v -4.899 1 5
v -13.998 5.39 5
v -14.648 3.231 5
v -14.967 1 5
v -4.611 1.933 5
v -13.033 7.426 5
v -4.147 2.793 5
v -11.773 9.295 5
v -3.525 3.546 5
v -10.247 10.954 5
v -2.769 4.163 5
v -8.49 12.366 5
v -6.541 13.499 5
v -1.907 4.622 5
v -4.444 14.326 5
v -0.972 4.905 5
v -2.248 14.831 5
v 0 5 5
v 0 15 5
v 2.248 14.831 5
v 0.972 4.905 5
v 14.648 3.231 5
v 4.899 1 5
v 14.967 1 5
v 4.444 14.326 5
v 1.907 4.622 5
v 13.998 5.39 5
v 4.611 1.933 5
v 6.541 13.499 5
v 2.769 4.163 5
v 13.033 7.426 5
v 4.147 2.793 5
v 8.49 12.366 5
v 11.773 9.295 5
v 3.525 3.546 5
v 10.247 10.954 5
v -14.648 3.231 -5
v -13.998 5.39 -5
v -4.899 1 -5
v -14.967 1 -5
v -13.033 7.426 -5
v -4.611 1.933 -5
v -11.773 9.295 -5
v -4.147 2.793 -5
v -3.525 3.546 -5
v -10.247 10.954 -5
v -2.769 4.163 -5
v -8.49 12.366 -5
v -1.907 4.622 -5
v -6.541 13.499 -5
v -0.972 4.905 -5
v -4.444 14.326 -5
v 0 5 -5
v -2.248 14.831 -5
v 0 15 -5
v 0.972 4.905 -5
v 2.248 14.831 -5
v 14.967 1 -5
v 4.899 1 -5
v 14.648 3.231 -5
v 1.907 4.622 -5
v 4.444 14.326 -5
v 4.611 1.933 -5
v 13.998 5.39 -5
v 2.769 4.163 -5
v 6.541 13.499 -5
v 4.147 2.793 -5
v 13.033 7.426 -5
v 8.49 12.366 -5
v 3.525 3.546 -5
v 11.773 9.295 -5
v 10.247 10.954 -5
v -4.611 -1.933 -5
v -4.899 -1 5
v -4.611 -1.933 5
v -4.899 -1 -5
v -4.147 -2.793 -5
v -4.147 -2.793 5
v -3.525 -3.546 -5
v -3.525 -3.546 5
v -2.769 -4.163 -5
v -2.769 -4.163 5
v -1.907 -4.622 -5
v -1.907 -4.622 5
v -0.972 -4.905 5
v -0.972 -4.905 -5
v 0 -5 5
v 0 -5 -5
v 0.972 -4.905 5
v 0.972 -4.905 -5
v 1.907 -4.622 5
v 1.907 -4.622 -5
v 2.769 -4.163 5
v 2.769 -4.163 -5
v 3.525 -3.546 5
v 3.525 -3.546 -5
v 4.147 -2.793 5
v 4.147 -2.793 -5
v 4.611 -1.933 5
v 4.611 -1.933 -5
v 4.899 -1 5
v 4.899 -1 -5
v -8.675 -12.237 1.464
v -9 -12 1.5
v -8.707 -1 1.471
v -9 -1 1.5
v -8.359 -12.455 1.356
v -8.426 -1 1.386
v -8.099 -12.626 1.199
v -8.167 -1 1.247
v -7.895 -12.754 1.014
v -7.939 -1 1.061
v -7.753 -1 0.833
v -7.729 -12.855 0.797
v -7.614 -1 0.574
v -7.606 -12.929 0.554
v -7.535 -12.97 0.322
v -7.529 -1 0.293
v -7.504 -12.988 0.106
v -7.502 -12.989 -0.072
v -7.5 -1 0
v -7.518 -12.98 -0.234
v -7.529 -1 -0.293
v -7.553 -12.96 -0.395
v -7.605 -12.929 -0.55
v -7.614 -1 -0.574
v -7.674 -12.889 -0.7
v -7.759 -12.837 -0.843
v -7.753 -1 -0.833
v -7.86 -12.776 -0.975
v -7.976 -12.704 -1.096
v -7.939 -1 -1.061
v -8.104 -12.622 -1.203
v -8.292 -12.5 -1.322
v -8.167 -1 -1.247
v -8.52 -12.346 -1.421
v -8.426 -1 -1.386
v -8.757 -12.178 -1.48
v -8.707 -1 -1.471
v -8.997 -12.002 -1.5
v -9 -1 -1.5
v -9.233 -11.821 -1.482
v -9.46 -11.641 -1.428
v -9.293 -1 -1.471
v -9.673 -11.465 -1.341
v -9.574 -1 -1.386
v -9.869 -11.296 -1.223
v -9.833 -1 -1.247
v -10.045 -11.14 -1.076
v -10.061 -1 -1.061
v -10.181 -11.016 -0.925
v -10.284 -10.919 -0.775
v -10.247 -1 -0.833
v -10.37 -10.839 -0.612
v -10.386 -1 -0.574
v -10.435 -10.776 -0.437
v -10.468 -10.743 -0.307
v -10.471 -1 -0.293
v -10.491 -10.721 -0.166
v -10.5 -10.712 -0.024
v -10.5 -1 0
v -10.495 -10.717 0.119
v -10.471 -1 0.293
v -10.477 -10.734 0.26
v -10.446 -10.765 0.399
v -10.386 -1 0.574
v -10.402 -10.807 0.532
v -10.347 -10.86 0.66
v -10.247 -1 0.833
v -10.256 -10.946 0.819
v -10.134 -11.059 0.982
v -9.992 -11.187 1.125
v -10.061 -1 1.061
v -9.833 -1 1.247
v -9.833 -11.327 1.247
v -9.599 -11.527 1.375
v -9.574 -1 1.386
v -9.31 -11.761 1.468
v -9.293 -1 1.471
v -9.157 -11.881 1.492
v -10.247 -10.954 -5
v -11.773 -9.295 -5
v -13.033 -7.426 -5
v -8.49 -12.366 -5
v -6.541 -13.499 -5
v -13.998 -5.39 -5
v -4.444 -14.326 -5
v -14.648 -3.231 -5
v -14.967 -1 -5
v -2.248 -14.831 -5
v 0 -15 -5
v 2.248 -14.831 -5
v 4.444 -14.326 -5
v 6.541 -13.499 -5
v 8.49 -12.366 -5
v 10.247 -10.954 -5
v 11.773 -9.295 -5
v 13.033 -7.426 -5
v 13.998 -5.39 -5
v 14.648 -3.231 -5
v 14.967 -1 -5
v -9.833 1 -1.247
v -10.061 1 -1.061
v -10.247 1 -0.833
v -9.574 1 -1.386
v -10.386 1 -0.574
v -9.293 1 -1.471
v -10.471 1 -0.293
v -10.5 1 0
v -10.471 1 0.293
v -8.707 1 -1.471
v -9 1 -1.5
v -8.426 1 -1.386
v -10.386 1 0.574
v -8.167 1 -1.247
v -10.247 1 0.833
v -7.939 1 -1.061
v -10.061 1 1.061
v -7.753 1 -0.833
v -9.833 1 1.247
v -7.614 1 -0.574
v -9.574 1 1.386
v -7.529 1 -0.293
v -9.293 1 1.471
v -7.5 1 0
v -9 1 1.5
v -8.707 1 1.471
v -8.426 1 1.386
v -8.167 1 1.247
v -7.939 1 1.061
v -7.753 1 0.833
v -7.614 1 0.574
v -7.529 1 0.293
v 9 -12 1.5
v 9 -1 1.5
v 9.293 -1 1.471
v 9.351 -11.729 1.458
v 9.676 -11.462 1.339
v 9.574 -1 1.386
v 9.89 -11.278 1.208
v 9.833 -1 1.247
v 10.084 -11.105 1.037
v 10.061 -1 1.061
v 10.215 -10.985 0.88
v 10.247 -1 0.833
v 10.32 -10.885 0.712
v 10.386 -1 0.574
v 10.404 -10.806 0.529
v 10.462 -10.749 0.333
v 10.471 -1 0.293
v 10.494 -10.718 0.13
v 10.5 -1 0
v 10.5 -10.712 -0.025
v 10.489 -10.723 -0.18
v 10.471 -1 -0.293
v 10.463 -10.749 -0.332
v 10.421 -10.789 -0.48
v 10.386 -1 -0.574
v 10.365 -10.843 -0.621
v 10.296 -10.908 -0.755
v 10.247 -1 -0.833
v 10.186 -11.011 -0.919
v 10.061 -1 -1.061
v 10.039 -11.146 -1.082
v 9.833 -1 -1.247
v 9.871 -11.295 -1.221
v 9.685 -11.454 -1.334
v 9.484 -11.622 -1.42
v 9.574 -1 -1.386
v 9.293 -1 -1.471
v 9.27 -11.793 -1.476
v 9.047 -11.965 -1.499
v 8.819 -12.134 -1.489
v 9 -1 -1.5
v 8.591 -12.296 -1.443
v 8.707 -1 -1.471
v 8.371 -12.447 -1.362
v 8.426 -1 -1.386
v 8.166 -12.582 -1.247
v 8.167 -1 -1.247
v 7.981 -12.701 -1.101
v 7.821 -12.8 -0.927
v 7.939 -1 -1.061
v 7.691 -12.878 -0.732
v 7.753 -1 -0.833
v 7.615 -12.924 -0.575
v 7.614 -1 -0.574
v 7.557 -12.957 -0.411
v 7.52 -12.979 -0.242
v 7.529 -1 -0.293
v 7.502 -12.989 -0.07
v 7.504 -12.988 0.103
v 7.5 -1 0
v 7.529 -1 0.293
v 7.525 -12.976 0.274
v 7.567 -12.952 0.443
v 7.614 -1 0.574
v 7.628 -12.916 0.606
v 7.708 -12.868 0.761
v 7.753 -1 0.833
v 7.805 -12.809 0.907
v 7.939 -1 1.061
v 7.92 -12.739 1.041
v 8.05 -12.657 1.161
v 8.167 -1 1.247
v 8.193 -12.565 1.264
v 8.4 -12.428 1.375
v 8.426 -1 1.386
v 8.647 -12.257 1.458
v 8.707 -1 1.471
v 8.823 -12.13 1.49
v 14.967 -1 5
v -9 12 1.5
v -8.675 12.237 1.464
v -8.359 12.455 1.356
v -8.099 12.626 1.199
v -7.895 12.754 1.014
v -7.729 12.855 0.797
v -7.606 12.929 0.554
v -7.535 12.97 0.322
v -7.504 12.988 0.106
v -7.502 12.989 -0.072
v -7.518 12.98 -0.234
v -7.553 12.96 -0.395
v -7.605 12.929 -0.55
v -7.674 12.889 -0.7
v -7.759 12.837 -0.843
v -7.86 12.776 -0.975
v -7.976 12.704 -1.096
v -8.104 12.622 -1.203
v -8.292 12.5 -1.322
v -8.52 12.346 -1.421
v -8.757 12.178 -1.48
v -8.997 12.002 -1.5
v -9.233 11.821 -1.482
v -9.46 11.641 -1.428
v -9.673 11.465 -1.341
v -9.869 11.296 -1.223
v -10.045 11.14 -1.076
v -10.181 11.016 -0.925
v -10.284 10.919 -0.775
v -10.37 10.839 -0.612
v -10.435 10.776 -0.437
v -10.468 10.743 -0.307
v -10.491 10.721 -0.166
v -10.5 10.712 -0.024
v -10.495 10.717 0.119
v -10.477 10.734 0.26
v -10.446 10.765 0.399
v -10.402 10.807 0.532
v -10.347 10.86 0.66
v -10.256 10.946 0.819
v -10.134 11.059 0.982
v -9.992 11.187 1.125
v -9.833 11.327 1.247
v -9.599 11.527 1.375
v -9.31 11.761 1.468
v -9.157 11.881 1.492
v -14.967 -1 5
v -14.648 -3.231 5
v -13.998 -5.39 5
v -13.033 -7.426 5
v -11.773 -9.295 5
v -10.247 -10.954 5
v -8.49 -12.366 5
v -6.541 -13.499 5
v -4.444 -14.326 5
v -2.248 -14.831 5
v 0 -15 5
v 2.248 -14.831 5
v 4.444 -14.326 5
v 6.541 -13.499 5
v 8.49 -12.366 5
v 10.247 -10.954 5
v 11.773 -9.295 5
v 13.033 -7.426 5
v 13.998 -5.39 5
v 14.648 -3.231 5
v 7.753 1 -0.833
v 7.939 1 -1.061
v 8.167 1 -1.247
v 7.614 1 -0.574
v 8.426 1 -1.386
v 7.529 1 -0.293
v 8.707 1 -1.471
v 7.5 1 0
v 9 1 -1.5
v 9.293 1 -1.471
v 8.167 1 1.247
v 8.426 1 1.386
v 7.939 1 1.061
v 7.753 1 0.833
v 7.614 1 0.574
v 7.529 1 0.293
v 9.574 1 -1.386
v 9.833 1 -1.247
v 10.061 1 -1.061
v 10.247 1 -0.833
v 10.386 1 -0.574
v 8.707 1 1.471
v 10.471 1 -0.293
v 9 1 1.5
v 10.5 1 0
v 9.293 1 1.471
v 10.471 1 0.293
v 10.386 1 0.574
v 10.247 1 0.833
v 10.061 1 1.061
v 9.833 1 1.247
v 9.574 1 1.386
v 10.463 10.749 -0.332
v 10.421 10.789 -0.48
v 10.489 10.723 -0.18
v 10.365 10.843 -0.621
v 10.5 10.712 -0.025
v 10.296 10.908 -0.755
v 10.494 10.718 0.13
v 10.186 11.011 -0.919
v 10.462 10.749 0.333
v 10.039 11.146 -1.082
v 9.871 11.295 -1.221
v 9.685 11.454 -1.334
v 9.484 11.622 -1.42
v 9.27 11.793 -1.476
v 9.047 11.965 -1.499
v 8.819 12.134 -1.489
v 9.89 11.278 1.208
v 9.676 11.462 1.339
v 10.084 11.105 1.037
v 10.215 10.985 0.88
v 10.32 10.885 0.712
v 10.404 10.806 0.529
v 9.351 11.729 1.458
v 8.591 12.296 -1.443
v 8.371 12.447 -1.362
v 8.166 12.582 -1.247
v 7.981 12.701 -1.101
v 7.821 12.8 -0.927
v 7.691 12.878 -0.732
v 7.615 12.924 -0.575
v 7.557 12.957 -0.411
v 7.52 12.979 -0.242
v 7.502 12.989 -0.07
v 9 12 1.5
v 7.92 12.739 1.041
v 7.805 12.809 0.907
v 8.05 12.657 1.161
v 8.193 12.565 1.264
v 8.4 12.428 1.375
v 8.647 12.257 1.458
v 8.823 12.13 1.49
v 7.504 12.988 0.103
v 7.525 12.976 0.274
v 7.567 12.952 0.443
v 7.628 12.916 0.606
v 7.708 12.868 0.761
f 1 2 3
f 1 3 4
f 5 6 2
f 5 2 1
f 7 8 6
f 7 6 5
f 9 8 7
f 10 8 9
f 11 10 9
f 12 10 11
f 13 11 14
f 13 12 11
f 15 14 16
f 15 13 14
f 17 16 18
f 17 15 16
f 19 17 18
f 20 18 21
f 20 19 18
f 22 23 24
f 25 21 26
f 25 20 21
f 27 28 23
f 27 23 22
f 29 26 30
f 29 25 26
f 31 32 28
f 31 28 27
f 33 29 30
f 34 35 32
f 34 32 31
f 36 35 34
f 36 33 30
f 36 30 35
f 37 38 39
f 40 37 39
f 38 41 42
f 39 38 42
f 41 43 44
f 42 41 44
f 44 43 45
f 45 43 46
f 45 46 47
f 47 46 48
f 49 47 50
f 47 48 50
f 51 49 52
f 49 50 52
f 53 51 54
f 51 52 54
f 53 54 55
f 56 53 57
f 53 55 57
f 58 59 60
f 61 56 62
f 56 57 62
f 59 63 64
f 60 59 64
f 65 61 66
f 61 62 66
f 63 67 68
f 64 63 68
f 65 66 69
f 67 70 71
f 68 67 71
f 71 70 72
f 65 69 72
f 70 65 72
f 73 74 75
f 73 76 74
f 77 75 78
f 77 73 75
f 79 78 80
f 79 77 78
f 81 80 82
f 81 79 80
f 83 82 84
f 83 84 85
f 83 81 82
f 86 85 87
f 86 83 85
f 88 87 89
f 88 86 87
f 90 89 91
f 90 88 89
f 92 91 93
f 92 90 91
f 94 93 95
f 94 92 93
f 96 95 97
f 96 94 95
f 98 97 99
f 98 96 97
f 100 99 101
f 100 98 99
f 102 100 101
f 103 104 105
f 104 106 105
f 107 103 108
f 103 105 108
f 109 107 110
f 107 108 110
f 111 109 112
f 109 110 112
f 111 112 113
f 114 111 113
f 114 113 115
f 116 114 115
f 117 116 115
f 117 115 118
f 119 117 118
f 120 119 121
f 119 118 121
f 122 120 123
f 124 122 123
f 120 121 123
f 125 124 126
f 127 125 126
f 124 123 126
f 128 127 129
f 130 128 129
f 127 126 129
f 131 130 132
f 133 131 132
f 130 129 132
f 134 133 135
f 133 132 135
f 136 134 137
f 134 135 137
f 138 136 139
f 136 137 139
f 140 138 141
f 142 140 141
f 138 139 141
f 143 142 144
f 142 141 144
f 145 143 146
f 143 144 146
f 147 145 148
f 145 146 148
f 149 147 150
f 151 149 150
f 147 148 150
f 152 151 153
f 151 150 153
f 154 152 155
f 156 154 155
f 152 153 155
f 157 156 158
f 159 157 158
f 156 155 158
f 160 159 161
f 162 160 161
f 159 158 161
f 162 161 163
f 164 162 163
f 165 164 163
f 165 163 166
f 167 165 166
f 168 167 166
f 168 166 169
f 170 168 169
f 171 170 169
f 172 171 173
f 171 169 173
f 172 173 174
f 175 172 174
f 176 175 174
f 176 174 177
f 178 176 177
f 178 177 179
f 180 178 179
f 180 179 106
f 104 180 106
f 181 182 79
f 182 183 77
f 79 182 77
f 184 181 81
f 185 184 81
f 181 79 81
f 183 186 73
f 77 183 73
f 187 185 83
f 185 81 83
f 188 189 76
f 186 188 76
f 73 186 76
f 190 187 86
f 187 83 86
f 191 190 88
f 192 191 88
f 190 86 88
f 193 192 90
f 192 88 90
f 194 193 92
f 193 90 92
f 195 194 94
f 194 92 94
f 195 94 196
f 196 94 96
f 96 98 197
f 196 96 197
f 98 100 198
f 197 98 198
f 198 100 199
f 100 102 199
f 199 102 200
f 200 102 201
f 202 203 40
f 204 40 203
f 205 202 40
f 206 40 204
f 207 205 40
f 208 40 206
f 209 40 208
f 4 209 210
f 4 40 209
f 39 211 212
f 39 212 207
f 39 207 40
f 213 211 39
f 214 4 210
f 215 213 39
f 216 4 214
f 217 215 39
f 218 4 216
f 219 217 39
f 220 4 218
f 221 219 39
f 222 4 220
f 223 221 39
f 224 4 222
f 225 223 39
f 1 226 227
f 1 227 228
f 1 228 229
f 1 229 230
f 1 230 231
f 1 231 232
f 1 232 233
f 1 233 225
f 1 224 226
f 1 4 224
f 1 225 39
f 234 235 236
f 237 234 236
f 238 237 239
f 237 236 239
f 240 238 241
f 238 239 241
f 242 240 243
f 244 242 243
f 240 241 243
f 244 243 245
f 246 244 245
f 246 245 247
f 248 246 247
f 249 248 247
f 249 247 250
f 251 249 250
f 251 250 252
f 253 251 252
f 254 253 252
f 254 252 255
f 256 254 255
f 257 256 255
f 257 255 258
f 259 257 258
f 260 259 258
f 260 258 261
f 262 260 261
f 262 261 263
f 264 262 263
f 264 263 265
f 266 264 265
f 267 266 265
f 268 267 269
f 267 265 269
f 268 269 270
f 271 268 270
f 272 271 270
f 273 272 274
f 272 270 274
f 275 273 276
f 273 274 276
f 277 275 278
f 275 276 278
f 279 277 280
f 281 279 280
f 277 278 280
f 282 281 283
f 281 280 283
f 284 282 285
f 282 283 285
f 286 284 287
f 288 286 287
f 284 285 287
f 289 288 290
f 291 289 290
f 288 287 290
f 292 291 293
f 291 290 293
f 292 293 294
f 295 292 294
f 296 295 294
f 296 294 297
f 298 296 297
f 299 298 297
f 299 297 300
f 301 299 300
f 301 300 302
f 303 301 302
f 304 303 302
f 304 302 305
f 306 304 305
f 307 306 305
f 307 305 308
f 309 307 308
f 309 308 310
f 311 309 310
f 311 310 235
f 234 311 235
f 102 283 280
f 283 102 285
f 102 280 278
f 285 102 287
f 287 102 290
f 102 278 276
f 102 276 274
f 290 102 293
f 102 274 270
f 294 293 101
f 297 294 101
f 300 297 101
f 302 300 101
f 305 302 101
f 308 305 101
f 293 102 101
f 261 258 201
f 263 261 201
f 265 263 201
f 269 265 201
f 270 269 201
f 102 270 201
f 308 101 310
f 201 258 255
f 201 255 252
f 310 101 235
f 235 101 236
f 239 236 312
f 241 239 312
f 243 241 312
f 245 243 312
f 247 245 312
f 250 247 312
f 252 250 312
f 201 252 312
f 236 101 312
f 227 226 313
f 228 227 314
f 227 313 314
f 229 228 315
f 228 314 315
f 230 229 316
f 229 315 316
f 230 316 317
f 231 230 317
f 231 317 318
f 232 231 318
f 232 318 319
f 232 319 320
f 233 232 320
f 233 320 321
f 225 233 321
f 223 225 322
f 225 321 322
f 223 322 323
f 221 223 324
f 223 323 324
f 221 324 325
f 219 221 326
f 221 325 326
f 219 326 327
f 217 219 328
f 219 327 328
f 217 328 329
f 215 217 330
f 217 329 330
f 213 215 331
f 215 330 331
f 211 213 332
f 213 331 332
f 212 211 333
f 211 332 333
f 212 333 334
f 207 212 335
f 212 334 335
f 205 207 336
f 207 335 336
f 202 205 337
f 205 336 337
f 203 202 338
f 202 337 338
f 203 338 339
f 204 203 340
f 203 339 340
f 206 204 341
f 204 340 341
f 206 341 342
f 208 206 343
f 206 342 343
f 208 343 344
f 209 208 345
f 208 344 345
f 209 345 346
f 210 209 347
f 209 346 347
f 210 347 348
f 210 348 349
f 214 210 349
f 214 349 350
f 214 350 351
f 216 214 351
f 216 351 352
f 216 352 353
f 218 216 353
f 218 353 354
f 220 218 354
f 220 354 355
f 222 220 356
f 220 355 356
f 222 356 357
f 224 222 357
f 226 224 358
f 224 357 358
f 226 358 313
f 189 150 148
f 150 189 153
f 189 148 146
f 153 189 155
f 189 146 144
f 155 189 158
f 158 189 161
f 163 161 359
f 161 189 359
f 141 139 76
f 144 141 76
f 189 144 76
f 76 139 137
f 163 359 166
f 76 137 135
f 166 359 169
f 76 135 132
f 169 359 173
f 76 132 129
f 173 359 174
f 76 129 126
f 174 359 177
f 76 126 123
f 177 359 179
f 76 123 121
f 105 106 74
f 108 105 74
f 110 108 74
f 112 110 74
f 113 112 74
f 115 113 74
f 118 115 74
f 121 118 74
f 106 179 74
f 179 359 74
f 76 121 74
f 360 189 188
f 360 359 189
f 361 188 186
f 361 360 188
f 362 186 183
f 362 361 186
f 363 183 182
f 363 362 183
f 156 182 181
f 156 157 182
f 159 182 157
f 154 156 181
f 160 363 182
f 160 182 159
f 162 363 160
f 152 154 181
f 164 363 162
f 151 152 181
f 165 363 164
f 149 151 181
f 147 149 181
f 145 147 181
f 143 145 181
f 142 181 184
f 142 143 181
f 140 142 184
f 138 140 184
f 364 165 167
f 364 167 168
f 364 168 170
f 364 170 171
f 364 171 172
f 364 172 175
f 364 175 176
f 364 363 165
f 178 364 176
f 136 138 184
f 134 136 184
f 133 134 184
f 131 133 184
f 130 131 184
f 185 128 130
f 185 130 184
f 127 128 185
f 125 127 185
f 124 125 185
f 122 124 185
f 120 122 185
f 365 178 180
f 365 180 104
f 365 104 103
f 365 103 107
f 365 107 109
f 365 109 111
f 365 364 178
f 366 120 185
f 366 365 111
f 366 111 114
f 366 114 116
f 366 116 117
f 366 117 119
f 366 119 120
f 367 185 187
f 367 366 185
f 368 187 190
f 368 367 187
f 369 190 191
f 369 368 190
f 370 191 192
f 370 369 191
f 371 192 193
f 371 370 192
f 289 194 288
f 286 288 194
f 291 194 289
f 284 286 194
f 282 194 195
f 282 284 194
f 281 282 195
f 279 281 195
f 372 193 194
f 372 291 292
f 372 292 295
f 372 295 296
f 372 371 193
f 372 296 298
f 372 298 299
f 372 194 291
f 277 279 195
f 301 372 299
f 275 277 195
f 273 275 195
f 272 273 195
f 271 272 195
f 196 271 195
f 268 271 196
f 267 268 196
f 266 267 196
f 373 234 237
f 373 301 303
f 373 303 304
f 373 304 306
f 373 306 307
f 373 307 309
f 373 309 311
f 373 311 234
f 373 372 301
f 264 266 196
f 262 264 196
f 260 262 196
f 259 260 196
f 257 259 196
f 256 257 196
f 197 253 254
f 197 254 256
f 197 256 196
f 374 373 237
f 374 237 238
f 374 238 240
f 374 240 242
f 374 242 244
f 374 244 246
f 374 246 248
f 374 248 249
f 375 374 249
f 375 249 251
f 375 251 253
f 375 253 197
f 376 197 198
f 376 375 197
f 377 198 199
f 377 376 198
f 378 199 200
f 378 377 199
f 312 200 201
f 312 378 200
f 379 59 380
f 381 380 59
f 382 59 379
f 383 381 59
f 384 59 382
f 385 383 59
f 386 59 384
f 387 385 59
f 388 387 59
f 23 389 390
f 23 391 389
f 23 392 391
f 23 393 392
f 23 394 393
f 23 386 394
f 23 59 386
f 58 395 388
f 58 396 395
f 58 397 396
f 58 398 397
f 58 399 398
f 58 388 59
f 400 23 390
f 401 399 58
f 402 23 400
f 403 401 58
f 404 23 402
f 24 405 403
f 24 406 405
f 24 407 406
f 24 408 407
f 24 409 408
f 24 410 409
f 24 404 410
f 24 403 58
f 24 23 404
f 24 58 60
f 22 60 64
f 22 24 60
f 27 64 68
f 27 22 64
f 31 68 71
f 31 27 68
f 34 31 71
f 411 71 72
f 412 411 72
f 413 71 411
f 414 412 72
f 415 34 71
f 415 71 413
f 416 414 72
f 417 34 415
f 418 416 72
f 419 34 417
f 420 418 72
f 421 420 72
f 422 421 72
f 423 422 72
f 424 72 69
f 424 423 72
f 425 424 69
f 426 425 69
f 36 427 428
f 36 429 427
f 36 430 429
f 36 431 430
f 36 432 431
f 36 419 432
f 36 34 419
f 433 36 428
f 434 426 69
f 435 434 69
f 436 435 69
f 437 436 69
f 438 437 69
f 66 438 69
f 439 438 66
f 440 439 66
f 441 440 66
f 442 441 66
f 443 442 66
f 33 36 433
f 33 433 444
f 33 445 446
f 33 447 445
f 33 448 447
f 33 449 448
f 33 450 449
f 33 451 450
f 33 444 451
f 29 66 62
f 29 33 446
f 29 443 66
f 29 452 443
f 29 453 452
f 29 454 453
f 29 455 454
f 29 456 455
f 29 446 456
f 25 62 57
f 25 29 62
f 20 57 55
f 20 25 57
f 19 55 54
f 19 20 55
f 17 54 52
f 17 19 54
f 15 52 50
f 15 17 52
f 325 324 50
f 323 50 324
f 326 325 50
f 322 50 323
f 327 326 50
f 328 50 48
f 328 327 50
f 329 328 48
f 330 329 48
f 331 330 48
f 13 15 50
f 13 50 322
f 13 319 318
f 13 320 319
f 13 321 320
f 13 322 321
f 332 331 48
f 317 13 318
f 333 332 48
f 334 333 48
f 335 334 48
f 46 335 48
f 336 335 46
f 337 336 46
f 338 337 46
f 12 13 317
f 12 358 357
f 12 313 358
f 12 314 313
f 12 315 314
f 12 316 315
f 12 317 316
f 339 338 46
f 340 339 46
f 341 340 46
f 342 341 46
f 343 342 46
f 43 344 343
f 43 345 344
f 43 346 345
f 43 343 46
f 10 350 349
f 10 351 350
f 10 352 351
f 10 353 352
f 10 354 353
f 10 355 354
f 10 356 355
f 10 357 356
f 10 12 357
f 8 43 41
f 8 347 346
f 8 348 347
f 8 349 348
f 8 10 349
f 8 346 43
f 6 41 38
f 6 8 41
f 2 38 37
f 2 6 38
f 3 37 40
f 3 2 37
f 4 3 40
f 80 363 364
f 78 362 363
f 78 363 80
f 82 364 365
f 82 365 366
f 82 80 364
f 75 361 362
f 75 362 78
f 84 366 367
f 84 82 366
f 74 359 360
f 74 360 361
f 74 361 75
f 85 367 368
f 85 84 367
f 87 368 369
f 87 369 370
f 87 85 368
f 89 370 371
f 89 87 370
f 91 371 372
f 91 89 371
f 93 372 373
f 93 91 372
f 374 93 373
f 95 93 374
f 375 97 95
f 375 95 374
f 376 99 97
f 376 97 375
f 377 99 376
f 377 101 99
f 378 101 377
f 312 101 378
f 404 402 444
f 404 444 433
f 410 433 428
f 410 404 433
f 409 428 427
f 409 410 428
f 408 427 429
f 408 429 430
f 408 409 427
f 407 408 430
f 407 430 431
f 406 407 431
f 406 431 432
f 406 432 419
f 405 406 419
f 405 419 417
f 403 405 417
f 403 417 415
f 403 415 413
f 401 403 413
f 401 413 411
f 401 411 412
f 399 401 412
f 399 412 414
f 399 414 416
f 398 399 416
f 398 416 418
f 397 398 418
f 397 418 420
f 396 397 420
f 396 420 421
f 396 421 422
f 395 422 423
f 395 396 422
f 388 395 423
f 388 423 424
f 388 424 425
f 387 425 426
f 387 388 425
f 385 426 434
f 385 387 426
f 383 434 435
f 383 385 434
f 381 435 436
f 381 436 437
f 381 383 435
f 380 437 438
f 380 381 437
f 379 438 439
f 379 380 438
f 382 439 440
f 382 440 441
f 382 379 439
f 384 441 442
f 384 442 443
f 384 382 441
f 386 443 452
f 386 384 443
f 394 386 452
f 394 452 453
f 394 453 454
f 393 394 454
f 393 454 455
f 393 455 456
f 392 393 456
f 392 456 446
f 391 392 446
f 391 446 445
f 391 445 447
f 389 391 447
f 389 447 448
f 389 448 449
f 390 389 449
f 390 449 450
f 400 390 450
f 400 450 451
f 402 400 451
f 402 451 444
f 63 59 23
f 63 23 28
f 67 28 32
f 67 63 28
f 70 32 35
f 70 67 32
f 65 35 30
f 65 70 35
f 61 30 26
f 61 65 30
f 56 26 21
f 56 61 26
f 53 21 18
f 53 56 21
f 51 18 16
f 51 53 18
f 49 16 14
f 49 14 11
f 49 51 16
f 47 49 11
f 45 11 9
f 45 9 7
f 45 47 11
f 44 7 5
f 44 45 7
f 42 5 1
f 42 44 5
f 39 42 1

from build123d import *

# Parameters (mm, degrees)
SKETCH_1_R          = 15
SKETCH_1_R_2        = 5
EXTRUDE_1_DEPTH     = 5
SKETCH_2_W          = 45.571754554
SKETCH_2_H          = 2
CUT_EXTRUDE_1_DEPTH = 33
SKETCH_4_R          = 1.5
CUT_EXTRUDE_2_DEPTH = 41.5


with BuildPart() as part:
    # 草图1 → 凸台-拉伸1 (new, symmetric)
    with BuildSketch(Plane.XY):
        Circle(SKETCH_1_R)
        Circle(SKETCH_1_R_2, mode=Mode.SUBTRACT)
    extrude(amount=EXTRUDE_1_DEPTH, both=True)

    # 草图2 → 切除-拉伸1 (cut)
    with BuildSketch(Plane.XY.offset(5)):
        Rectangle(SKETCH_2_W, SKETCH_2_H)
    extrude(amount=-CUT_EXTRUDE_1_DEPTH, mode=Mode.SUBTRACT)


with BuildPart() as cut_extrude_1_piece_1:
    # of the separate pieces the step leaves, piece 1, a body of its own (cut_extrude_1_pieces)
    add(part.part.solids().sort_by_distance((14.966629547, 1, -5))[0])


with BuildPart() as cut_extrude_1_piece_2:
    # of the separate pieces the step leaves, piece 2, a body of its own (cut_extrude_1_pieces)
    add(part.part.solids().sort_by_distance((-14.966629547, -1, -5))[0])


with BuildPart() as cut_extrude_2_tool:
    # 草图4 → 切除-拉伸2 (new, symmetric)
    with BuildSketch(Plane(origin=(0, 0, 0), x_dir=(1, 0, 0), z_dir=(0, 1, 0))):
        with Locations(Location((9, 0, 0), (0, 0, 270))):
            Circle(SKETCH_4_R)
        with Locations(Location((-9, 0, 0), (0, 0, 270))):
            Circle(SKETCH_4_R)
    extrude(amount=CUT_EXTRUDE_2_DEPTH, both=True)


with BuildPart() as cut_extrude_1_piece_1_1:
    add(cut_extrude_1_piece_1.part)

    # 切除-拉伸2: cut by cut_extrude_2_tool
    add(cut_extrude_2_tool.part, mode=Mode.SUBTRACT)


with BuildPart() as cut_extrude_1_piece_2_1:
    add(cut_extrude_1_piece_2.part)

    # 切除-拉伸2: cut by cut_extrude_2_tool
    add(cut_extrude_2_tool.part, mode=Mode.SUBTRACT)


solid = Compound([cut_extrude_1_piece_1_1.part, cut_extrude_1_piece_2_1.part])
